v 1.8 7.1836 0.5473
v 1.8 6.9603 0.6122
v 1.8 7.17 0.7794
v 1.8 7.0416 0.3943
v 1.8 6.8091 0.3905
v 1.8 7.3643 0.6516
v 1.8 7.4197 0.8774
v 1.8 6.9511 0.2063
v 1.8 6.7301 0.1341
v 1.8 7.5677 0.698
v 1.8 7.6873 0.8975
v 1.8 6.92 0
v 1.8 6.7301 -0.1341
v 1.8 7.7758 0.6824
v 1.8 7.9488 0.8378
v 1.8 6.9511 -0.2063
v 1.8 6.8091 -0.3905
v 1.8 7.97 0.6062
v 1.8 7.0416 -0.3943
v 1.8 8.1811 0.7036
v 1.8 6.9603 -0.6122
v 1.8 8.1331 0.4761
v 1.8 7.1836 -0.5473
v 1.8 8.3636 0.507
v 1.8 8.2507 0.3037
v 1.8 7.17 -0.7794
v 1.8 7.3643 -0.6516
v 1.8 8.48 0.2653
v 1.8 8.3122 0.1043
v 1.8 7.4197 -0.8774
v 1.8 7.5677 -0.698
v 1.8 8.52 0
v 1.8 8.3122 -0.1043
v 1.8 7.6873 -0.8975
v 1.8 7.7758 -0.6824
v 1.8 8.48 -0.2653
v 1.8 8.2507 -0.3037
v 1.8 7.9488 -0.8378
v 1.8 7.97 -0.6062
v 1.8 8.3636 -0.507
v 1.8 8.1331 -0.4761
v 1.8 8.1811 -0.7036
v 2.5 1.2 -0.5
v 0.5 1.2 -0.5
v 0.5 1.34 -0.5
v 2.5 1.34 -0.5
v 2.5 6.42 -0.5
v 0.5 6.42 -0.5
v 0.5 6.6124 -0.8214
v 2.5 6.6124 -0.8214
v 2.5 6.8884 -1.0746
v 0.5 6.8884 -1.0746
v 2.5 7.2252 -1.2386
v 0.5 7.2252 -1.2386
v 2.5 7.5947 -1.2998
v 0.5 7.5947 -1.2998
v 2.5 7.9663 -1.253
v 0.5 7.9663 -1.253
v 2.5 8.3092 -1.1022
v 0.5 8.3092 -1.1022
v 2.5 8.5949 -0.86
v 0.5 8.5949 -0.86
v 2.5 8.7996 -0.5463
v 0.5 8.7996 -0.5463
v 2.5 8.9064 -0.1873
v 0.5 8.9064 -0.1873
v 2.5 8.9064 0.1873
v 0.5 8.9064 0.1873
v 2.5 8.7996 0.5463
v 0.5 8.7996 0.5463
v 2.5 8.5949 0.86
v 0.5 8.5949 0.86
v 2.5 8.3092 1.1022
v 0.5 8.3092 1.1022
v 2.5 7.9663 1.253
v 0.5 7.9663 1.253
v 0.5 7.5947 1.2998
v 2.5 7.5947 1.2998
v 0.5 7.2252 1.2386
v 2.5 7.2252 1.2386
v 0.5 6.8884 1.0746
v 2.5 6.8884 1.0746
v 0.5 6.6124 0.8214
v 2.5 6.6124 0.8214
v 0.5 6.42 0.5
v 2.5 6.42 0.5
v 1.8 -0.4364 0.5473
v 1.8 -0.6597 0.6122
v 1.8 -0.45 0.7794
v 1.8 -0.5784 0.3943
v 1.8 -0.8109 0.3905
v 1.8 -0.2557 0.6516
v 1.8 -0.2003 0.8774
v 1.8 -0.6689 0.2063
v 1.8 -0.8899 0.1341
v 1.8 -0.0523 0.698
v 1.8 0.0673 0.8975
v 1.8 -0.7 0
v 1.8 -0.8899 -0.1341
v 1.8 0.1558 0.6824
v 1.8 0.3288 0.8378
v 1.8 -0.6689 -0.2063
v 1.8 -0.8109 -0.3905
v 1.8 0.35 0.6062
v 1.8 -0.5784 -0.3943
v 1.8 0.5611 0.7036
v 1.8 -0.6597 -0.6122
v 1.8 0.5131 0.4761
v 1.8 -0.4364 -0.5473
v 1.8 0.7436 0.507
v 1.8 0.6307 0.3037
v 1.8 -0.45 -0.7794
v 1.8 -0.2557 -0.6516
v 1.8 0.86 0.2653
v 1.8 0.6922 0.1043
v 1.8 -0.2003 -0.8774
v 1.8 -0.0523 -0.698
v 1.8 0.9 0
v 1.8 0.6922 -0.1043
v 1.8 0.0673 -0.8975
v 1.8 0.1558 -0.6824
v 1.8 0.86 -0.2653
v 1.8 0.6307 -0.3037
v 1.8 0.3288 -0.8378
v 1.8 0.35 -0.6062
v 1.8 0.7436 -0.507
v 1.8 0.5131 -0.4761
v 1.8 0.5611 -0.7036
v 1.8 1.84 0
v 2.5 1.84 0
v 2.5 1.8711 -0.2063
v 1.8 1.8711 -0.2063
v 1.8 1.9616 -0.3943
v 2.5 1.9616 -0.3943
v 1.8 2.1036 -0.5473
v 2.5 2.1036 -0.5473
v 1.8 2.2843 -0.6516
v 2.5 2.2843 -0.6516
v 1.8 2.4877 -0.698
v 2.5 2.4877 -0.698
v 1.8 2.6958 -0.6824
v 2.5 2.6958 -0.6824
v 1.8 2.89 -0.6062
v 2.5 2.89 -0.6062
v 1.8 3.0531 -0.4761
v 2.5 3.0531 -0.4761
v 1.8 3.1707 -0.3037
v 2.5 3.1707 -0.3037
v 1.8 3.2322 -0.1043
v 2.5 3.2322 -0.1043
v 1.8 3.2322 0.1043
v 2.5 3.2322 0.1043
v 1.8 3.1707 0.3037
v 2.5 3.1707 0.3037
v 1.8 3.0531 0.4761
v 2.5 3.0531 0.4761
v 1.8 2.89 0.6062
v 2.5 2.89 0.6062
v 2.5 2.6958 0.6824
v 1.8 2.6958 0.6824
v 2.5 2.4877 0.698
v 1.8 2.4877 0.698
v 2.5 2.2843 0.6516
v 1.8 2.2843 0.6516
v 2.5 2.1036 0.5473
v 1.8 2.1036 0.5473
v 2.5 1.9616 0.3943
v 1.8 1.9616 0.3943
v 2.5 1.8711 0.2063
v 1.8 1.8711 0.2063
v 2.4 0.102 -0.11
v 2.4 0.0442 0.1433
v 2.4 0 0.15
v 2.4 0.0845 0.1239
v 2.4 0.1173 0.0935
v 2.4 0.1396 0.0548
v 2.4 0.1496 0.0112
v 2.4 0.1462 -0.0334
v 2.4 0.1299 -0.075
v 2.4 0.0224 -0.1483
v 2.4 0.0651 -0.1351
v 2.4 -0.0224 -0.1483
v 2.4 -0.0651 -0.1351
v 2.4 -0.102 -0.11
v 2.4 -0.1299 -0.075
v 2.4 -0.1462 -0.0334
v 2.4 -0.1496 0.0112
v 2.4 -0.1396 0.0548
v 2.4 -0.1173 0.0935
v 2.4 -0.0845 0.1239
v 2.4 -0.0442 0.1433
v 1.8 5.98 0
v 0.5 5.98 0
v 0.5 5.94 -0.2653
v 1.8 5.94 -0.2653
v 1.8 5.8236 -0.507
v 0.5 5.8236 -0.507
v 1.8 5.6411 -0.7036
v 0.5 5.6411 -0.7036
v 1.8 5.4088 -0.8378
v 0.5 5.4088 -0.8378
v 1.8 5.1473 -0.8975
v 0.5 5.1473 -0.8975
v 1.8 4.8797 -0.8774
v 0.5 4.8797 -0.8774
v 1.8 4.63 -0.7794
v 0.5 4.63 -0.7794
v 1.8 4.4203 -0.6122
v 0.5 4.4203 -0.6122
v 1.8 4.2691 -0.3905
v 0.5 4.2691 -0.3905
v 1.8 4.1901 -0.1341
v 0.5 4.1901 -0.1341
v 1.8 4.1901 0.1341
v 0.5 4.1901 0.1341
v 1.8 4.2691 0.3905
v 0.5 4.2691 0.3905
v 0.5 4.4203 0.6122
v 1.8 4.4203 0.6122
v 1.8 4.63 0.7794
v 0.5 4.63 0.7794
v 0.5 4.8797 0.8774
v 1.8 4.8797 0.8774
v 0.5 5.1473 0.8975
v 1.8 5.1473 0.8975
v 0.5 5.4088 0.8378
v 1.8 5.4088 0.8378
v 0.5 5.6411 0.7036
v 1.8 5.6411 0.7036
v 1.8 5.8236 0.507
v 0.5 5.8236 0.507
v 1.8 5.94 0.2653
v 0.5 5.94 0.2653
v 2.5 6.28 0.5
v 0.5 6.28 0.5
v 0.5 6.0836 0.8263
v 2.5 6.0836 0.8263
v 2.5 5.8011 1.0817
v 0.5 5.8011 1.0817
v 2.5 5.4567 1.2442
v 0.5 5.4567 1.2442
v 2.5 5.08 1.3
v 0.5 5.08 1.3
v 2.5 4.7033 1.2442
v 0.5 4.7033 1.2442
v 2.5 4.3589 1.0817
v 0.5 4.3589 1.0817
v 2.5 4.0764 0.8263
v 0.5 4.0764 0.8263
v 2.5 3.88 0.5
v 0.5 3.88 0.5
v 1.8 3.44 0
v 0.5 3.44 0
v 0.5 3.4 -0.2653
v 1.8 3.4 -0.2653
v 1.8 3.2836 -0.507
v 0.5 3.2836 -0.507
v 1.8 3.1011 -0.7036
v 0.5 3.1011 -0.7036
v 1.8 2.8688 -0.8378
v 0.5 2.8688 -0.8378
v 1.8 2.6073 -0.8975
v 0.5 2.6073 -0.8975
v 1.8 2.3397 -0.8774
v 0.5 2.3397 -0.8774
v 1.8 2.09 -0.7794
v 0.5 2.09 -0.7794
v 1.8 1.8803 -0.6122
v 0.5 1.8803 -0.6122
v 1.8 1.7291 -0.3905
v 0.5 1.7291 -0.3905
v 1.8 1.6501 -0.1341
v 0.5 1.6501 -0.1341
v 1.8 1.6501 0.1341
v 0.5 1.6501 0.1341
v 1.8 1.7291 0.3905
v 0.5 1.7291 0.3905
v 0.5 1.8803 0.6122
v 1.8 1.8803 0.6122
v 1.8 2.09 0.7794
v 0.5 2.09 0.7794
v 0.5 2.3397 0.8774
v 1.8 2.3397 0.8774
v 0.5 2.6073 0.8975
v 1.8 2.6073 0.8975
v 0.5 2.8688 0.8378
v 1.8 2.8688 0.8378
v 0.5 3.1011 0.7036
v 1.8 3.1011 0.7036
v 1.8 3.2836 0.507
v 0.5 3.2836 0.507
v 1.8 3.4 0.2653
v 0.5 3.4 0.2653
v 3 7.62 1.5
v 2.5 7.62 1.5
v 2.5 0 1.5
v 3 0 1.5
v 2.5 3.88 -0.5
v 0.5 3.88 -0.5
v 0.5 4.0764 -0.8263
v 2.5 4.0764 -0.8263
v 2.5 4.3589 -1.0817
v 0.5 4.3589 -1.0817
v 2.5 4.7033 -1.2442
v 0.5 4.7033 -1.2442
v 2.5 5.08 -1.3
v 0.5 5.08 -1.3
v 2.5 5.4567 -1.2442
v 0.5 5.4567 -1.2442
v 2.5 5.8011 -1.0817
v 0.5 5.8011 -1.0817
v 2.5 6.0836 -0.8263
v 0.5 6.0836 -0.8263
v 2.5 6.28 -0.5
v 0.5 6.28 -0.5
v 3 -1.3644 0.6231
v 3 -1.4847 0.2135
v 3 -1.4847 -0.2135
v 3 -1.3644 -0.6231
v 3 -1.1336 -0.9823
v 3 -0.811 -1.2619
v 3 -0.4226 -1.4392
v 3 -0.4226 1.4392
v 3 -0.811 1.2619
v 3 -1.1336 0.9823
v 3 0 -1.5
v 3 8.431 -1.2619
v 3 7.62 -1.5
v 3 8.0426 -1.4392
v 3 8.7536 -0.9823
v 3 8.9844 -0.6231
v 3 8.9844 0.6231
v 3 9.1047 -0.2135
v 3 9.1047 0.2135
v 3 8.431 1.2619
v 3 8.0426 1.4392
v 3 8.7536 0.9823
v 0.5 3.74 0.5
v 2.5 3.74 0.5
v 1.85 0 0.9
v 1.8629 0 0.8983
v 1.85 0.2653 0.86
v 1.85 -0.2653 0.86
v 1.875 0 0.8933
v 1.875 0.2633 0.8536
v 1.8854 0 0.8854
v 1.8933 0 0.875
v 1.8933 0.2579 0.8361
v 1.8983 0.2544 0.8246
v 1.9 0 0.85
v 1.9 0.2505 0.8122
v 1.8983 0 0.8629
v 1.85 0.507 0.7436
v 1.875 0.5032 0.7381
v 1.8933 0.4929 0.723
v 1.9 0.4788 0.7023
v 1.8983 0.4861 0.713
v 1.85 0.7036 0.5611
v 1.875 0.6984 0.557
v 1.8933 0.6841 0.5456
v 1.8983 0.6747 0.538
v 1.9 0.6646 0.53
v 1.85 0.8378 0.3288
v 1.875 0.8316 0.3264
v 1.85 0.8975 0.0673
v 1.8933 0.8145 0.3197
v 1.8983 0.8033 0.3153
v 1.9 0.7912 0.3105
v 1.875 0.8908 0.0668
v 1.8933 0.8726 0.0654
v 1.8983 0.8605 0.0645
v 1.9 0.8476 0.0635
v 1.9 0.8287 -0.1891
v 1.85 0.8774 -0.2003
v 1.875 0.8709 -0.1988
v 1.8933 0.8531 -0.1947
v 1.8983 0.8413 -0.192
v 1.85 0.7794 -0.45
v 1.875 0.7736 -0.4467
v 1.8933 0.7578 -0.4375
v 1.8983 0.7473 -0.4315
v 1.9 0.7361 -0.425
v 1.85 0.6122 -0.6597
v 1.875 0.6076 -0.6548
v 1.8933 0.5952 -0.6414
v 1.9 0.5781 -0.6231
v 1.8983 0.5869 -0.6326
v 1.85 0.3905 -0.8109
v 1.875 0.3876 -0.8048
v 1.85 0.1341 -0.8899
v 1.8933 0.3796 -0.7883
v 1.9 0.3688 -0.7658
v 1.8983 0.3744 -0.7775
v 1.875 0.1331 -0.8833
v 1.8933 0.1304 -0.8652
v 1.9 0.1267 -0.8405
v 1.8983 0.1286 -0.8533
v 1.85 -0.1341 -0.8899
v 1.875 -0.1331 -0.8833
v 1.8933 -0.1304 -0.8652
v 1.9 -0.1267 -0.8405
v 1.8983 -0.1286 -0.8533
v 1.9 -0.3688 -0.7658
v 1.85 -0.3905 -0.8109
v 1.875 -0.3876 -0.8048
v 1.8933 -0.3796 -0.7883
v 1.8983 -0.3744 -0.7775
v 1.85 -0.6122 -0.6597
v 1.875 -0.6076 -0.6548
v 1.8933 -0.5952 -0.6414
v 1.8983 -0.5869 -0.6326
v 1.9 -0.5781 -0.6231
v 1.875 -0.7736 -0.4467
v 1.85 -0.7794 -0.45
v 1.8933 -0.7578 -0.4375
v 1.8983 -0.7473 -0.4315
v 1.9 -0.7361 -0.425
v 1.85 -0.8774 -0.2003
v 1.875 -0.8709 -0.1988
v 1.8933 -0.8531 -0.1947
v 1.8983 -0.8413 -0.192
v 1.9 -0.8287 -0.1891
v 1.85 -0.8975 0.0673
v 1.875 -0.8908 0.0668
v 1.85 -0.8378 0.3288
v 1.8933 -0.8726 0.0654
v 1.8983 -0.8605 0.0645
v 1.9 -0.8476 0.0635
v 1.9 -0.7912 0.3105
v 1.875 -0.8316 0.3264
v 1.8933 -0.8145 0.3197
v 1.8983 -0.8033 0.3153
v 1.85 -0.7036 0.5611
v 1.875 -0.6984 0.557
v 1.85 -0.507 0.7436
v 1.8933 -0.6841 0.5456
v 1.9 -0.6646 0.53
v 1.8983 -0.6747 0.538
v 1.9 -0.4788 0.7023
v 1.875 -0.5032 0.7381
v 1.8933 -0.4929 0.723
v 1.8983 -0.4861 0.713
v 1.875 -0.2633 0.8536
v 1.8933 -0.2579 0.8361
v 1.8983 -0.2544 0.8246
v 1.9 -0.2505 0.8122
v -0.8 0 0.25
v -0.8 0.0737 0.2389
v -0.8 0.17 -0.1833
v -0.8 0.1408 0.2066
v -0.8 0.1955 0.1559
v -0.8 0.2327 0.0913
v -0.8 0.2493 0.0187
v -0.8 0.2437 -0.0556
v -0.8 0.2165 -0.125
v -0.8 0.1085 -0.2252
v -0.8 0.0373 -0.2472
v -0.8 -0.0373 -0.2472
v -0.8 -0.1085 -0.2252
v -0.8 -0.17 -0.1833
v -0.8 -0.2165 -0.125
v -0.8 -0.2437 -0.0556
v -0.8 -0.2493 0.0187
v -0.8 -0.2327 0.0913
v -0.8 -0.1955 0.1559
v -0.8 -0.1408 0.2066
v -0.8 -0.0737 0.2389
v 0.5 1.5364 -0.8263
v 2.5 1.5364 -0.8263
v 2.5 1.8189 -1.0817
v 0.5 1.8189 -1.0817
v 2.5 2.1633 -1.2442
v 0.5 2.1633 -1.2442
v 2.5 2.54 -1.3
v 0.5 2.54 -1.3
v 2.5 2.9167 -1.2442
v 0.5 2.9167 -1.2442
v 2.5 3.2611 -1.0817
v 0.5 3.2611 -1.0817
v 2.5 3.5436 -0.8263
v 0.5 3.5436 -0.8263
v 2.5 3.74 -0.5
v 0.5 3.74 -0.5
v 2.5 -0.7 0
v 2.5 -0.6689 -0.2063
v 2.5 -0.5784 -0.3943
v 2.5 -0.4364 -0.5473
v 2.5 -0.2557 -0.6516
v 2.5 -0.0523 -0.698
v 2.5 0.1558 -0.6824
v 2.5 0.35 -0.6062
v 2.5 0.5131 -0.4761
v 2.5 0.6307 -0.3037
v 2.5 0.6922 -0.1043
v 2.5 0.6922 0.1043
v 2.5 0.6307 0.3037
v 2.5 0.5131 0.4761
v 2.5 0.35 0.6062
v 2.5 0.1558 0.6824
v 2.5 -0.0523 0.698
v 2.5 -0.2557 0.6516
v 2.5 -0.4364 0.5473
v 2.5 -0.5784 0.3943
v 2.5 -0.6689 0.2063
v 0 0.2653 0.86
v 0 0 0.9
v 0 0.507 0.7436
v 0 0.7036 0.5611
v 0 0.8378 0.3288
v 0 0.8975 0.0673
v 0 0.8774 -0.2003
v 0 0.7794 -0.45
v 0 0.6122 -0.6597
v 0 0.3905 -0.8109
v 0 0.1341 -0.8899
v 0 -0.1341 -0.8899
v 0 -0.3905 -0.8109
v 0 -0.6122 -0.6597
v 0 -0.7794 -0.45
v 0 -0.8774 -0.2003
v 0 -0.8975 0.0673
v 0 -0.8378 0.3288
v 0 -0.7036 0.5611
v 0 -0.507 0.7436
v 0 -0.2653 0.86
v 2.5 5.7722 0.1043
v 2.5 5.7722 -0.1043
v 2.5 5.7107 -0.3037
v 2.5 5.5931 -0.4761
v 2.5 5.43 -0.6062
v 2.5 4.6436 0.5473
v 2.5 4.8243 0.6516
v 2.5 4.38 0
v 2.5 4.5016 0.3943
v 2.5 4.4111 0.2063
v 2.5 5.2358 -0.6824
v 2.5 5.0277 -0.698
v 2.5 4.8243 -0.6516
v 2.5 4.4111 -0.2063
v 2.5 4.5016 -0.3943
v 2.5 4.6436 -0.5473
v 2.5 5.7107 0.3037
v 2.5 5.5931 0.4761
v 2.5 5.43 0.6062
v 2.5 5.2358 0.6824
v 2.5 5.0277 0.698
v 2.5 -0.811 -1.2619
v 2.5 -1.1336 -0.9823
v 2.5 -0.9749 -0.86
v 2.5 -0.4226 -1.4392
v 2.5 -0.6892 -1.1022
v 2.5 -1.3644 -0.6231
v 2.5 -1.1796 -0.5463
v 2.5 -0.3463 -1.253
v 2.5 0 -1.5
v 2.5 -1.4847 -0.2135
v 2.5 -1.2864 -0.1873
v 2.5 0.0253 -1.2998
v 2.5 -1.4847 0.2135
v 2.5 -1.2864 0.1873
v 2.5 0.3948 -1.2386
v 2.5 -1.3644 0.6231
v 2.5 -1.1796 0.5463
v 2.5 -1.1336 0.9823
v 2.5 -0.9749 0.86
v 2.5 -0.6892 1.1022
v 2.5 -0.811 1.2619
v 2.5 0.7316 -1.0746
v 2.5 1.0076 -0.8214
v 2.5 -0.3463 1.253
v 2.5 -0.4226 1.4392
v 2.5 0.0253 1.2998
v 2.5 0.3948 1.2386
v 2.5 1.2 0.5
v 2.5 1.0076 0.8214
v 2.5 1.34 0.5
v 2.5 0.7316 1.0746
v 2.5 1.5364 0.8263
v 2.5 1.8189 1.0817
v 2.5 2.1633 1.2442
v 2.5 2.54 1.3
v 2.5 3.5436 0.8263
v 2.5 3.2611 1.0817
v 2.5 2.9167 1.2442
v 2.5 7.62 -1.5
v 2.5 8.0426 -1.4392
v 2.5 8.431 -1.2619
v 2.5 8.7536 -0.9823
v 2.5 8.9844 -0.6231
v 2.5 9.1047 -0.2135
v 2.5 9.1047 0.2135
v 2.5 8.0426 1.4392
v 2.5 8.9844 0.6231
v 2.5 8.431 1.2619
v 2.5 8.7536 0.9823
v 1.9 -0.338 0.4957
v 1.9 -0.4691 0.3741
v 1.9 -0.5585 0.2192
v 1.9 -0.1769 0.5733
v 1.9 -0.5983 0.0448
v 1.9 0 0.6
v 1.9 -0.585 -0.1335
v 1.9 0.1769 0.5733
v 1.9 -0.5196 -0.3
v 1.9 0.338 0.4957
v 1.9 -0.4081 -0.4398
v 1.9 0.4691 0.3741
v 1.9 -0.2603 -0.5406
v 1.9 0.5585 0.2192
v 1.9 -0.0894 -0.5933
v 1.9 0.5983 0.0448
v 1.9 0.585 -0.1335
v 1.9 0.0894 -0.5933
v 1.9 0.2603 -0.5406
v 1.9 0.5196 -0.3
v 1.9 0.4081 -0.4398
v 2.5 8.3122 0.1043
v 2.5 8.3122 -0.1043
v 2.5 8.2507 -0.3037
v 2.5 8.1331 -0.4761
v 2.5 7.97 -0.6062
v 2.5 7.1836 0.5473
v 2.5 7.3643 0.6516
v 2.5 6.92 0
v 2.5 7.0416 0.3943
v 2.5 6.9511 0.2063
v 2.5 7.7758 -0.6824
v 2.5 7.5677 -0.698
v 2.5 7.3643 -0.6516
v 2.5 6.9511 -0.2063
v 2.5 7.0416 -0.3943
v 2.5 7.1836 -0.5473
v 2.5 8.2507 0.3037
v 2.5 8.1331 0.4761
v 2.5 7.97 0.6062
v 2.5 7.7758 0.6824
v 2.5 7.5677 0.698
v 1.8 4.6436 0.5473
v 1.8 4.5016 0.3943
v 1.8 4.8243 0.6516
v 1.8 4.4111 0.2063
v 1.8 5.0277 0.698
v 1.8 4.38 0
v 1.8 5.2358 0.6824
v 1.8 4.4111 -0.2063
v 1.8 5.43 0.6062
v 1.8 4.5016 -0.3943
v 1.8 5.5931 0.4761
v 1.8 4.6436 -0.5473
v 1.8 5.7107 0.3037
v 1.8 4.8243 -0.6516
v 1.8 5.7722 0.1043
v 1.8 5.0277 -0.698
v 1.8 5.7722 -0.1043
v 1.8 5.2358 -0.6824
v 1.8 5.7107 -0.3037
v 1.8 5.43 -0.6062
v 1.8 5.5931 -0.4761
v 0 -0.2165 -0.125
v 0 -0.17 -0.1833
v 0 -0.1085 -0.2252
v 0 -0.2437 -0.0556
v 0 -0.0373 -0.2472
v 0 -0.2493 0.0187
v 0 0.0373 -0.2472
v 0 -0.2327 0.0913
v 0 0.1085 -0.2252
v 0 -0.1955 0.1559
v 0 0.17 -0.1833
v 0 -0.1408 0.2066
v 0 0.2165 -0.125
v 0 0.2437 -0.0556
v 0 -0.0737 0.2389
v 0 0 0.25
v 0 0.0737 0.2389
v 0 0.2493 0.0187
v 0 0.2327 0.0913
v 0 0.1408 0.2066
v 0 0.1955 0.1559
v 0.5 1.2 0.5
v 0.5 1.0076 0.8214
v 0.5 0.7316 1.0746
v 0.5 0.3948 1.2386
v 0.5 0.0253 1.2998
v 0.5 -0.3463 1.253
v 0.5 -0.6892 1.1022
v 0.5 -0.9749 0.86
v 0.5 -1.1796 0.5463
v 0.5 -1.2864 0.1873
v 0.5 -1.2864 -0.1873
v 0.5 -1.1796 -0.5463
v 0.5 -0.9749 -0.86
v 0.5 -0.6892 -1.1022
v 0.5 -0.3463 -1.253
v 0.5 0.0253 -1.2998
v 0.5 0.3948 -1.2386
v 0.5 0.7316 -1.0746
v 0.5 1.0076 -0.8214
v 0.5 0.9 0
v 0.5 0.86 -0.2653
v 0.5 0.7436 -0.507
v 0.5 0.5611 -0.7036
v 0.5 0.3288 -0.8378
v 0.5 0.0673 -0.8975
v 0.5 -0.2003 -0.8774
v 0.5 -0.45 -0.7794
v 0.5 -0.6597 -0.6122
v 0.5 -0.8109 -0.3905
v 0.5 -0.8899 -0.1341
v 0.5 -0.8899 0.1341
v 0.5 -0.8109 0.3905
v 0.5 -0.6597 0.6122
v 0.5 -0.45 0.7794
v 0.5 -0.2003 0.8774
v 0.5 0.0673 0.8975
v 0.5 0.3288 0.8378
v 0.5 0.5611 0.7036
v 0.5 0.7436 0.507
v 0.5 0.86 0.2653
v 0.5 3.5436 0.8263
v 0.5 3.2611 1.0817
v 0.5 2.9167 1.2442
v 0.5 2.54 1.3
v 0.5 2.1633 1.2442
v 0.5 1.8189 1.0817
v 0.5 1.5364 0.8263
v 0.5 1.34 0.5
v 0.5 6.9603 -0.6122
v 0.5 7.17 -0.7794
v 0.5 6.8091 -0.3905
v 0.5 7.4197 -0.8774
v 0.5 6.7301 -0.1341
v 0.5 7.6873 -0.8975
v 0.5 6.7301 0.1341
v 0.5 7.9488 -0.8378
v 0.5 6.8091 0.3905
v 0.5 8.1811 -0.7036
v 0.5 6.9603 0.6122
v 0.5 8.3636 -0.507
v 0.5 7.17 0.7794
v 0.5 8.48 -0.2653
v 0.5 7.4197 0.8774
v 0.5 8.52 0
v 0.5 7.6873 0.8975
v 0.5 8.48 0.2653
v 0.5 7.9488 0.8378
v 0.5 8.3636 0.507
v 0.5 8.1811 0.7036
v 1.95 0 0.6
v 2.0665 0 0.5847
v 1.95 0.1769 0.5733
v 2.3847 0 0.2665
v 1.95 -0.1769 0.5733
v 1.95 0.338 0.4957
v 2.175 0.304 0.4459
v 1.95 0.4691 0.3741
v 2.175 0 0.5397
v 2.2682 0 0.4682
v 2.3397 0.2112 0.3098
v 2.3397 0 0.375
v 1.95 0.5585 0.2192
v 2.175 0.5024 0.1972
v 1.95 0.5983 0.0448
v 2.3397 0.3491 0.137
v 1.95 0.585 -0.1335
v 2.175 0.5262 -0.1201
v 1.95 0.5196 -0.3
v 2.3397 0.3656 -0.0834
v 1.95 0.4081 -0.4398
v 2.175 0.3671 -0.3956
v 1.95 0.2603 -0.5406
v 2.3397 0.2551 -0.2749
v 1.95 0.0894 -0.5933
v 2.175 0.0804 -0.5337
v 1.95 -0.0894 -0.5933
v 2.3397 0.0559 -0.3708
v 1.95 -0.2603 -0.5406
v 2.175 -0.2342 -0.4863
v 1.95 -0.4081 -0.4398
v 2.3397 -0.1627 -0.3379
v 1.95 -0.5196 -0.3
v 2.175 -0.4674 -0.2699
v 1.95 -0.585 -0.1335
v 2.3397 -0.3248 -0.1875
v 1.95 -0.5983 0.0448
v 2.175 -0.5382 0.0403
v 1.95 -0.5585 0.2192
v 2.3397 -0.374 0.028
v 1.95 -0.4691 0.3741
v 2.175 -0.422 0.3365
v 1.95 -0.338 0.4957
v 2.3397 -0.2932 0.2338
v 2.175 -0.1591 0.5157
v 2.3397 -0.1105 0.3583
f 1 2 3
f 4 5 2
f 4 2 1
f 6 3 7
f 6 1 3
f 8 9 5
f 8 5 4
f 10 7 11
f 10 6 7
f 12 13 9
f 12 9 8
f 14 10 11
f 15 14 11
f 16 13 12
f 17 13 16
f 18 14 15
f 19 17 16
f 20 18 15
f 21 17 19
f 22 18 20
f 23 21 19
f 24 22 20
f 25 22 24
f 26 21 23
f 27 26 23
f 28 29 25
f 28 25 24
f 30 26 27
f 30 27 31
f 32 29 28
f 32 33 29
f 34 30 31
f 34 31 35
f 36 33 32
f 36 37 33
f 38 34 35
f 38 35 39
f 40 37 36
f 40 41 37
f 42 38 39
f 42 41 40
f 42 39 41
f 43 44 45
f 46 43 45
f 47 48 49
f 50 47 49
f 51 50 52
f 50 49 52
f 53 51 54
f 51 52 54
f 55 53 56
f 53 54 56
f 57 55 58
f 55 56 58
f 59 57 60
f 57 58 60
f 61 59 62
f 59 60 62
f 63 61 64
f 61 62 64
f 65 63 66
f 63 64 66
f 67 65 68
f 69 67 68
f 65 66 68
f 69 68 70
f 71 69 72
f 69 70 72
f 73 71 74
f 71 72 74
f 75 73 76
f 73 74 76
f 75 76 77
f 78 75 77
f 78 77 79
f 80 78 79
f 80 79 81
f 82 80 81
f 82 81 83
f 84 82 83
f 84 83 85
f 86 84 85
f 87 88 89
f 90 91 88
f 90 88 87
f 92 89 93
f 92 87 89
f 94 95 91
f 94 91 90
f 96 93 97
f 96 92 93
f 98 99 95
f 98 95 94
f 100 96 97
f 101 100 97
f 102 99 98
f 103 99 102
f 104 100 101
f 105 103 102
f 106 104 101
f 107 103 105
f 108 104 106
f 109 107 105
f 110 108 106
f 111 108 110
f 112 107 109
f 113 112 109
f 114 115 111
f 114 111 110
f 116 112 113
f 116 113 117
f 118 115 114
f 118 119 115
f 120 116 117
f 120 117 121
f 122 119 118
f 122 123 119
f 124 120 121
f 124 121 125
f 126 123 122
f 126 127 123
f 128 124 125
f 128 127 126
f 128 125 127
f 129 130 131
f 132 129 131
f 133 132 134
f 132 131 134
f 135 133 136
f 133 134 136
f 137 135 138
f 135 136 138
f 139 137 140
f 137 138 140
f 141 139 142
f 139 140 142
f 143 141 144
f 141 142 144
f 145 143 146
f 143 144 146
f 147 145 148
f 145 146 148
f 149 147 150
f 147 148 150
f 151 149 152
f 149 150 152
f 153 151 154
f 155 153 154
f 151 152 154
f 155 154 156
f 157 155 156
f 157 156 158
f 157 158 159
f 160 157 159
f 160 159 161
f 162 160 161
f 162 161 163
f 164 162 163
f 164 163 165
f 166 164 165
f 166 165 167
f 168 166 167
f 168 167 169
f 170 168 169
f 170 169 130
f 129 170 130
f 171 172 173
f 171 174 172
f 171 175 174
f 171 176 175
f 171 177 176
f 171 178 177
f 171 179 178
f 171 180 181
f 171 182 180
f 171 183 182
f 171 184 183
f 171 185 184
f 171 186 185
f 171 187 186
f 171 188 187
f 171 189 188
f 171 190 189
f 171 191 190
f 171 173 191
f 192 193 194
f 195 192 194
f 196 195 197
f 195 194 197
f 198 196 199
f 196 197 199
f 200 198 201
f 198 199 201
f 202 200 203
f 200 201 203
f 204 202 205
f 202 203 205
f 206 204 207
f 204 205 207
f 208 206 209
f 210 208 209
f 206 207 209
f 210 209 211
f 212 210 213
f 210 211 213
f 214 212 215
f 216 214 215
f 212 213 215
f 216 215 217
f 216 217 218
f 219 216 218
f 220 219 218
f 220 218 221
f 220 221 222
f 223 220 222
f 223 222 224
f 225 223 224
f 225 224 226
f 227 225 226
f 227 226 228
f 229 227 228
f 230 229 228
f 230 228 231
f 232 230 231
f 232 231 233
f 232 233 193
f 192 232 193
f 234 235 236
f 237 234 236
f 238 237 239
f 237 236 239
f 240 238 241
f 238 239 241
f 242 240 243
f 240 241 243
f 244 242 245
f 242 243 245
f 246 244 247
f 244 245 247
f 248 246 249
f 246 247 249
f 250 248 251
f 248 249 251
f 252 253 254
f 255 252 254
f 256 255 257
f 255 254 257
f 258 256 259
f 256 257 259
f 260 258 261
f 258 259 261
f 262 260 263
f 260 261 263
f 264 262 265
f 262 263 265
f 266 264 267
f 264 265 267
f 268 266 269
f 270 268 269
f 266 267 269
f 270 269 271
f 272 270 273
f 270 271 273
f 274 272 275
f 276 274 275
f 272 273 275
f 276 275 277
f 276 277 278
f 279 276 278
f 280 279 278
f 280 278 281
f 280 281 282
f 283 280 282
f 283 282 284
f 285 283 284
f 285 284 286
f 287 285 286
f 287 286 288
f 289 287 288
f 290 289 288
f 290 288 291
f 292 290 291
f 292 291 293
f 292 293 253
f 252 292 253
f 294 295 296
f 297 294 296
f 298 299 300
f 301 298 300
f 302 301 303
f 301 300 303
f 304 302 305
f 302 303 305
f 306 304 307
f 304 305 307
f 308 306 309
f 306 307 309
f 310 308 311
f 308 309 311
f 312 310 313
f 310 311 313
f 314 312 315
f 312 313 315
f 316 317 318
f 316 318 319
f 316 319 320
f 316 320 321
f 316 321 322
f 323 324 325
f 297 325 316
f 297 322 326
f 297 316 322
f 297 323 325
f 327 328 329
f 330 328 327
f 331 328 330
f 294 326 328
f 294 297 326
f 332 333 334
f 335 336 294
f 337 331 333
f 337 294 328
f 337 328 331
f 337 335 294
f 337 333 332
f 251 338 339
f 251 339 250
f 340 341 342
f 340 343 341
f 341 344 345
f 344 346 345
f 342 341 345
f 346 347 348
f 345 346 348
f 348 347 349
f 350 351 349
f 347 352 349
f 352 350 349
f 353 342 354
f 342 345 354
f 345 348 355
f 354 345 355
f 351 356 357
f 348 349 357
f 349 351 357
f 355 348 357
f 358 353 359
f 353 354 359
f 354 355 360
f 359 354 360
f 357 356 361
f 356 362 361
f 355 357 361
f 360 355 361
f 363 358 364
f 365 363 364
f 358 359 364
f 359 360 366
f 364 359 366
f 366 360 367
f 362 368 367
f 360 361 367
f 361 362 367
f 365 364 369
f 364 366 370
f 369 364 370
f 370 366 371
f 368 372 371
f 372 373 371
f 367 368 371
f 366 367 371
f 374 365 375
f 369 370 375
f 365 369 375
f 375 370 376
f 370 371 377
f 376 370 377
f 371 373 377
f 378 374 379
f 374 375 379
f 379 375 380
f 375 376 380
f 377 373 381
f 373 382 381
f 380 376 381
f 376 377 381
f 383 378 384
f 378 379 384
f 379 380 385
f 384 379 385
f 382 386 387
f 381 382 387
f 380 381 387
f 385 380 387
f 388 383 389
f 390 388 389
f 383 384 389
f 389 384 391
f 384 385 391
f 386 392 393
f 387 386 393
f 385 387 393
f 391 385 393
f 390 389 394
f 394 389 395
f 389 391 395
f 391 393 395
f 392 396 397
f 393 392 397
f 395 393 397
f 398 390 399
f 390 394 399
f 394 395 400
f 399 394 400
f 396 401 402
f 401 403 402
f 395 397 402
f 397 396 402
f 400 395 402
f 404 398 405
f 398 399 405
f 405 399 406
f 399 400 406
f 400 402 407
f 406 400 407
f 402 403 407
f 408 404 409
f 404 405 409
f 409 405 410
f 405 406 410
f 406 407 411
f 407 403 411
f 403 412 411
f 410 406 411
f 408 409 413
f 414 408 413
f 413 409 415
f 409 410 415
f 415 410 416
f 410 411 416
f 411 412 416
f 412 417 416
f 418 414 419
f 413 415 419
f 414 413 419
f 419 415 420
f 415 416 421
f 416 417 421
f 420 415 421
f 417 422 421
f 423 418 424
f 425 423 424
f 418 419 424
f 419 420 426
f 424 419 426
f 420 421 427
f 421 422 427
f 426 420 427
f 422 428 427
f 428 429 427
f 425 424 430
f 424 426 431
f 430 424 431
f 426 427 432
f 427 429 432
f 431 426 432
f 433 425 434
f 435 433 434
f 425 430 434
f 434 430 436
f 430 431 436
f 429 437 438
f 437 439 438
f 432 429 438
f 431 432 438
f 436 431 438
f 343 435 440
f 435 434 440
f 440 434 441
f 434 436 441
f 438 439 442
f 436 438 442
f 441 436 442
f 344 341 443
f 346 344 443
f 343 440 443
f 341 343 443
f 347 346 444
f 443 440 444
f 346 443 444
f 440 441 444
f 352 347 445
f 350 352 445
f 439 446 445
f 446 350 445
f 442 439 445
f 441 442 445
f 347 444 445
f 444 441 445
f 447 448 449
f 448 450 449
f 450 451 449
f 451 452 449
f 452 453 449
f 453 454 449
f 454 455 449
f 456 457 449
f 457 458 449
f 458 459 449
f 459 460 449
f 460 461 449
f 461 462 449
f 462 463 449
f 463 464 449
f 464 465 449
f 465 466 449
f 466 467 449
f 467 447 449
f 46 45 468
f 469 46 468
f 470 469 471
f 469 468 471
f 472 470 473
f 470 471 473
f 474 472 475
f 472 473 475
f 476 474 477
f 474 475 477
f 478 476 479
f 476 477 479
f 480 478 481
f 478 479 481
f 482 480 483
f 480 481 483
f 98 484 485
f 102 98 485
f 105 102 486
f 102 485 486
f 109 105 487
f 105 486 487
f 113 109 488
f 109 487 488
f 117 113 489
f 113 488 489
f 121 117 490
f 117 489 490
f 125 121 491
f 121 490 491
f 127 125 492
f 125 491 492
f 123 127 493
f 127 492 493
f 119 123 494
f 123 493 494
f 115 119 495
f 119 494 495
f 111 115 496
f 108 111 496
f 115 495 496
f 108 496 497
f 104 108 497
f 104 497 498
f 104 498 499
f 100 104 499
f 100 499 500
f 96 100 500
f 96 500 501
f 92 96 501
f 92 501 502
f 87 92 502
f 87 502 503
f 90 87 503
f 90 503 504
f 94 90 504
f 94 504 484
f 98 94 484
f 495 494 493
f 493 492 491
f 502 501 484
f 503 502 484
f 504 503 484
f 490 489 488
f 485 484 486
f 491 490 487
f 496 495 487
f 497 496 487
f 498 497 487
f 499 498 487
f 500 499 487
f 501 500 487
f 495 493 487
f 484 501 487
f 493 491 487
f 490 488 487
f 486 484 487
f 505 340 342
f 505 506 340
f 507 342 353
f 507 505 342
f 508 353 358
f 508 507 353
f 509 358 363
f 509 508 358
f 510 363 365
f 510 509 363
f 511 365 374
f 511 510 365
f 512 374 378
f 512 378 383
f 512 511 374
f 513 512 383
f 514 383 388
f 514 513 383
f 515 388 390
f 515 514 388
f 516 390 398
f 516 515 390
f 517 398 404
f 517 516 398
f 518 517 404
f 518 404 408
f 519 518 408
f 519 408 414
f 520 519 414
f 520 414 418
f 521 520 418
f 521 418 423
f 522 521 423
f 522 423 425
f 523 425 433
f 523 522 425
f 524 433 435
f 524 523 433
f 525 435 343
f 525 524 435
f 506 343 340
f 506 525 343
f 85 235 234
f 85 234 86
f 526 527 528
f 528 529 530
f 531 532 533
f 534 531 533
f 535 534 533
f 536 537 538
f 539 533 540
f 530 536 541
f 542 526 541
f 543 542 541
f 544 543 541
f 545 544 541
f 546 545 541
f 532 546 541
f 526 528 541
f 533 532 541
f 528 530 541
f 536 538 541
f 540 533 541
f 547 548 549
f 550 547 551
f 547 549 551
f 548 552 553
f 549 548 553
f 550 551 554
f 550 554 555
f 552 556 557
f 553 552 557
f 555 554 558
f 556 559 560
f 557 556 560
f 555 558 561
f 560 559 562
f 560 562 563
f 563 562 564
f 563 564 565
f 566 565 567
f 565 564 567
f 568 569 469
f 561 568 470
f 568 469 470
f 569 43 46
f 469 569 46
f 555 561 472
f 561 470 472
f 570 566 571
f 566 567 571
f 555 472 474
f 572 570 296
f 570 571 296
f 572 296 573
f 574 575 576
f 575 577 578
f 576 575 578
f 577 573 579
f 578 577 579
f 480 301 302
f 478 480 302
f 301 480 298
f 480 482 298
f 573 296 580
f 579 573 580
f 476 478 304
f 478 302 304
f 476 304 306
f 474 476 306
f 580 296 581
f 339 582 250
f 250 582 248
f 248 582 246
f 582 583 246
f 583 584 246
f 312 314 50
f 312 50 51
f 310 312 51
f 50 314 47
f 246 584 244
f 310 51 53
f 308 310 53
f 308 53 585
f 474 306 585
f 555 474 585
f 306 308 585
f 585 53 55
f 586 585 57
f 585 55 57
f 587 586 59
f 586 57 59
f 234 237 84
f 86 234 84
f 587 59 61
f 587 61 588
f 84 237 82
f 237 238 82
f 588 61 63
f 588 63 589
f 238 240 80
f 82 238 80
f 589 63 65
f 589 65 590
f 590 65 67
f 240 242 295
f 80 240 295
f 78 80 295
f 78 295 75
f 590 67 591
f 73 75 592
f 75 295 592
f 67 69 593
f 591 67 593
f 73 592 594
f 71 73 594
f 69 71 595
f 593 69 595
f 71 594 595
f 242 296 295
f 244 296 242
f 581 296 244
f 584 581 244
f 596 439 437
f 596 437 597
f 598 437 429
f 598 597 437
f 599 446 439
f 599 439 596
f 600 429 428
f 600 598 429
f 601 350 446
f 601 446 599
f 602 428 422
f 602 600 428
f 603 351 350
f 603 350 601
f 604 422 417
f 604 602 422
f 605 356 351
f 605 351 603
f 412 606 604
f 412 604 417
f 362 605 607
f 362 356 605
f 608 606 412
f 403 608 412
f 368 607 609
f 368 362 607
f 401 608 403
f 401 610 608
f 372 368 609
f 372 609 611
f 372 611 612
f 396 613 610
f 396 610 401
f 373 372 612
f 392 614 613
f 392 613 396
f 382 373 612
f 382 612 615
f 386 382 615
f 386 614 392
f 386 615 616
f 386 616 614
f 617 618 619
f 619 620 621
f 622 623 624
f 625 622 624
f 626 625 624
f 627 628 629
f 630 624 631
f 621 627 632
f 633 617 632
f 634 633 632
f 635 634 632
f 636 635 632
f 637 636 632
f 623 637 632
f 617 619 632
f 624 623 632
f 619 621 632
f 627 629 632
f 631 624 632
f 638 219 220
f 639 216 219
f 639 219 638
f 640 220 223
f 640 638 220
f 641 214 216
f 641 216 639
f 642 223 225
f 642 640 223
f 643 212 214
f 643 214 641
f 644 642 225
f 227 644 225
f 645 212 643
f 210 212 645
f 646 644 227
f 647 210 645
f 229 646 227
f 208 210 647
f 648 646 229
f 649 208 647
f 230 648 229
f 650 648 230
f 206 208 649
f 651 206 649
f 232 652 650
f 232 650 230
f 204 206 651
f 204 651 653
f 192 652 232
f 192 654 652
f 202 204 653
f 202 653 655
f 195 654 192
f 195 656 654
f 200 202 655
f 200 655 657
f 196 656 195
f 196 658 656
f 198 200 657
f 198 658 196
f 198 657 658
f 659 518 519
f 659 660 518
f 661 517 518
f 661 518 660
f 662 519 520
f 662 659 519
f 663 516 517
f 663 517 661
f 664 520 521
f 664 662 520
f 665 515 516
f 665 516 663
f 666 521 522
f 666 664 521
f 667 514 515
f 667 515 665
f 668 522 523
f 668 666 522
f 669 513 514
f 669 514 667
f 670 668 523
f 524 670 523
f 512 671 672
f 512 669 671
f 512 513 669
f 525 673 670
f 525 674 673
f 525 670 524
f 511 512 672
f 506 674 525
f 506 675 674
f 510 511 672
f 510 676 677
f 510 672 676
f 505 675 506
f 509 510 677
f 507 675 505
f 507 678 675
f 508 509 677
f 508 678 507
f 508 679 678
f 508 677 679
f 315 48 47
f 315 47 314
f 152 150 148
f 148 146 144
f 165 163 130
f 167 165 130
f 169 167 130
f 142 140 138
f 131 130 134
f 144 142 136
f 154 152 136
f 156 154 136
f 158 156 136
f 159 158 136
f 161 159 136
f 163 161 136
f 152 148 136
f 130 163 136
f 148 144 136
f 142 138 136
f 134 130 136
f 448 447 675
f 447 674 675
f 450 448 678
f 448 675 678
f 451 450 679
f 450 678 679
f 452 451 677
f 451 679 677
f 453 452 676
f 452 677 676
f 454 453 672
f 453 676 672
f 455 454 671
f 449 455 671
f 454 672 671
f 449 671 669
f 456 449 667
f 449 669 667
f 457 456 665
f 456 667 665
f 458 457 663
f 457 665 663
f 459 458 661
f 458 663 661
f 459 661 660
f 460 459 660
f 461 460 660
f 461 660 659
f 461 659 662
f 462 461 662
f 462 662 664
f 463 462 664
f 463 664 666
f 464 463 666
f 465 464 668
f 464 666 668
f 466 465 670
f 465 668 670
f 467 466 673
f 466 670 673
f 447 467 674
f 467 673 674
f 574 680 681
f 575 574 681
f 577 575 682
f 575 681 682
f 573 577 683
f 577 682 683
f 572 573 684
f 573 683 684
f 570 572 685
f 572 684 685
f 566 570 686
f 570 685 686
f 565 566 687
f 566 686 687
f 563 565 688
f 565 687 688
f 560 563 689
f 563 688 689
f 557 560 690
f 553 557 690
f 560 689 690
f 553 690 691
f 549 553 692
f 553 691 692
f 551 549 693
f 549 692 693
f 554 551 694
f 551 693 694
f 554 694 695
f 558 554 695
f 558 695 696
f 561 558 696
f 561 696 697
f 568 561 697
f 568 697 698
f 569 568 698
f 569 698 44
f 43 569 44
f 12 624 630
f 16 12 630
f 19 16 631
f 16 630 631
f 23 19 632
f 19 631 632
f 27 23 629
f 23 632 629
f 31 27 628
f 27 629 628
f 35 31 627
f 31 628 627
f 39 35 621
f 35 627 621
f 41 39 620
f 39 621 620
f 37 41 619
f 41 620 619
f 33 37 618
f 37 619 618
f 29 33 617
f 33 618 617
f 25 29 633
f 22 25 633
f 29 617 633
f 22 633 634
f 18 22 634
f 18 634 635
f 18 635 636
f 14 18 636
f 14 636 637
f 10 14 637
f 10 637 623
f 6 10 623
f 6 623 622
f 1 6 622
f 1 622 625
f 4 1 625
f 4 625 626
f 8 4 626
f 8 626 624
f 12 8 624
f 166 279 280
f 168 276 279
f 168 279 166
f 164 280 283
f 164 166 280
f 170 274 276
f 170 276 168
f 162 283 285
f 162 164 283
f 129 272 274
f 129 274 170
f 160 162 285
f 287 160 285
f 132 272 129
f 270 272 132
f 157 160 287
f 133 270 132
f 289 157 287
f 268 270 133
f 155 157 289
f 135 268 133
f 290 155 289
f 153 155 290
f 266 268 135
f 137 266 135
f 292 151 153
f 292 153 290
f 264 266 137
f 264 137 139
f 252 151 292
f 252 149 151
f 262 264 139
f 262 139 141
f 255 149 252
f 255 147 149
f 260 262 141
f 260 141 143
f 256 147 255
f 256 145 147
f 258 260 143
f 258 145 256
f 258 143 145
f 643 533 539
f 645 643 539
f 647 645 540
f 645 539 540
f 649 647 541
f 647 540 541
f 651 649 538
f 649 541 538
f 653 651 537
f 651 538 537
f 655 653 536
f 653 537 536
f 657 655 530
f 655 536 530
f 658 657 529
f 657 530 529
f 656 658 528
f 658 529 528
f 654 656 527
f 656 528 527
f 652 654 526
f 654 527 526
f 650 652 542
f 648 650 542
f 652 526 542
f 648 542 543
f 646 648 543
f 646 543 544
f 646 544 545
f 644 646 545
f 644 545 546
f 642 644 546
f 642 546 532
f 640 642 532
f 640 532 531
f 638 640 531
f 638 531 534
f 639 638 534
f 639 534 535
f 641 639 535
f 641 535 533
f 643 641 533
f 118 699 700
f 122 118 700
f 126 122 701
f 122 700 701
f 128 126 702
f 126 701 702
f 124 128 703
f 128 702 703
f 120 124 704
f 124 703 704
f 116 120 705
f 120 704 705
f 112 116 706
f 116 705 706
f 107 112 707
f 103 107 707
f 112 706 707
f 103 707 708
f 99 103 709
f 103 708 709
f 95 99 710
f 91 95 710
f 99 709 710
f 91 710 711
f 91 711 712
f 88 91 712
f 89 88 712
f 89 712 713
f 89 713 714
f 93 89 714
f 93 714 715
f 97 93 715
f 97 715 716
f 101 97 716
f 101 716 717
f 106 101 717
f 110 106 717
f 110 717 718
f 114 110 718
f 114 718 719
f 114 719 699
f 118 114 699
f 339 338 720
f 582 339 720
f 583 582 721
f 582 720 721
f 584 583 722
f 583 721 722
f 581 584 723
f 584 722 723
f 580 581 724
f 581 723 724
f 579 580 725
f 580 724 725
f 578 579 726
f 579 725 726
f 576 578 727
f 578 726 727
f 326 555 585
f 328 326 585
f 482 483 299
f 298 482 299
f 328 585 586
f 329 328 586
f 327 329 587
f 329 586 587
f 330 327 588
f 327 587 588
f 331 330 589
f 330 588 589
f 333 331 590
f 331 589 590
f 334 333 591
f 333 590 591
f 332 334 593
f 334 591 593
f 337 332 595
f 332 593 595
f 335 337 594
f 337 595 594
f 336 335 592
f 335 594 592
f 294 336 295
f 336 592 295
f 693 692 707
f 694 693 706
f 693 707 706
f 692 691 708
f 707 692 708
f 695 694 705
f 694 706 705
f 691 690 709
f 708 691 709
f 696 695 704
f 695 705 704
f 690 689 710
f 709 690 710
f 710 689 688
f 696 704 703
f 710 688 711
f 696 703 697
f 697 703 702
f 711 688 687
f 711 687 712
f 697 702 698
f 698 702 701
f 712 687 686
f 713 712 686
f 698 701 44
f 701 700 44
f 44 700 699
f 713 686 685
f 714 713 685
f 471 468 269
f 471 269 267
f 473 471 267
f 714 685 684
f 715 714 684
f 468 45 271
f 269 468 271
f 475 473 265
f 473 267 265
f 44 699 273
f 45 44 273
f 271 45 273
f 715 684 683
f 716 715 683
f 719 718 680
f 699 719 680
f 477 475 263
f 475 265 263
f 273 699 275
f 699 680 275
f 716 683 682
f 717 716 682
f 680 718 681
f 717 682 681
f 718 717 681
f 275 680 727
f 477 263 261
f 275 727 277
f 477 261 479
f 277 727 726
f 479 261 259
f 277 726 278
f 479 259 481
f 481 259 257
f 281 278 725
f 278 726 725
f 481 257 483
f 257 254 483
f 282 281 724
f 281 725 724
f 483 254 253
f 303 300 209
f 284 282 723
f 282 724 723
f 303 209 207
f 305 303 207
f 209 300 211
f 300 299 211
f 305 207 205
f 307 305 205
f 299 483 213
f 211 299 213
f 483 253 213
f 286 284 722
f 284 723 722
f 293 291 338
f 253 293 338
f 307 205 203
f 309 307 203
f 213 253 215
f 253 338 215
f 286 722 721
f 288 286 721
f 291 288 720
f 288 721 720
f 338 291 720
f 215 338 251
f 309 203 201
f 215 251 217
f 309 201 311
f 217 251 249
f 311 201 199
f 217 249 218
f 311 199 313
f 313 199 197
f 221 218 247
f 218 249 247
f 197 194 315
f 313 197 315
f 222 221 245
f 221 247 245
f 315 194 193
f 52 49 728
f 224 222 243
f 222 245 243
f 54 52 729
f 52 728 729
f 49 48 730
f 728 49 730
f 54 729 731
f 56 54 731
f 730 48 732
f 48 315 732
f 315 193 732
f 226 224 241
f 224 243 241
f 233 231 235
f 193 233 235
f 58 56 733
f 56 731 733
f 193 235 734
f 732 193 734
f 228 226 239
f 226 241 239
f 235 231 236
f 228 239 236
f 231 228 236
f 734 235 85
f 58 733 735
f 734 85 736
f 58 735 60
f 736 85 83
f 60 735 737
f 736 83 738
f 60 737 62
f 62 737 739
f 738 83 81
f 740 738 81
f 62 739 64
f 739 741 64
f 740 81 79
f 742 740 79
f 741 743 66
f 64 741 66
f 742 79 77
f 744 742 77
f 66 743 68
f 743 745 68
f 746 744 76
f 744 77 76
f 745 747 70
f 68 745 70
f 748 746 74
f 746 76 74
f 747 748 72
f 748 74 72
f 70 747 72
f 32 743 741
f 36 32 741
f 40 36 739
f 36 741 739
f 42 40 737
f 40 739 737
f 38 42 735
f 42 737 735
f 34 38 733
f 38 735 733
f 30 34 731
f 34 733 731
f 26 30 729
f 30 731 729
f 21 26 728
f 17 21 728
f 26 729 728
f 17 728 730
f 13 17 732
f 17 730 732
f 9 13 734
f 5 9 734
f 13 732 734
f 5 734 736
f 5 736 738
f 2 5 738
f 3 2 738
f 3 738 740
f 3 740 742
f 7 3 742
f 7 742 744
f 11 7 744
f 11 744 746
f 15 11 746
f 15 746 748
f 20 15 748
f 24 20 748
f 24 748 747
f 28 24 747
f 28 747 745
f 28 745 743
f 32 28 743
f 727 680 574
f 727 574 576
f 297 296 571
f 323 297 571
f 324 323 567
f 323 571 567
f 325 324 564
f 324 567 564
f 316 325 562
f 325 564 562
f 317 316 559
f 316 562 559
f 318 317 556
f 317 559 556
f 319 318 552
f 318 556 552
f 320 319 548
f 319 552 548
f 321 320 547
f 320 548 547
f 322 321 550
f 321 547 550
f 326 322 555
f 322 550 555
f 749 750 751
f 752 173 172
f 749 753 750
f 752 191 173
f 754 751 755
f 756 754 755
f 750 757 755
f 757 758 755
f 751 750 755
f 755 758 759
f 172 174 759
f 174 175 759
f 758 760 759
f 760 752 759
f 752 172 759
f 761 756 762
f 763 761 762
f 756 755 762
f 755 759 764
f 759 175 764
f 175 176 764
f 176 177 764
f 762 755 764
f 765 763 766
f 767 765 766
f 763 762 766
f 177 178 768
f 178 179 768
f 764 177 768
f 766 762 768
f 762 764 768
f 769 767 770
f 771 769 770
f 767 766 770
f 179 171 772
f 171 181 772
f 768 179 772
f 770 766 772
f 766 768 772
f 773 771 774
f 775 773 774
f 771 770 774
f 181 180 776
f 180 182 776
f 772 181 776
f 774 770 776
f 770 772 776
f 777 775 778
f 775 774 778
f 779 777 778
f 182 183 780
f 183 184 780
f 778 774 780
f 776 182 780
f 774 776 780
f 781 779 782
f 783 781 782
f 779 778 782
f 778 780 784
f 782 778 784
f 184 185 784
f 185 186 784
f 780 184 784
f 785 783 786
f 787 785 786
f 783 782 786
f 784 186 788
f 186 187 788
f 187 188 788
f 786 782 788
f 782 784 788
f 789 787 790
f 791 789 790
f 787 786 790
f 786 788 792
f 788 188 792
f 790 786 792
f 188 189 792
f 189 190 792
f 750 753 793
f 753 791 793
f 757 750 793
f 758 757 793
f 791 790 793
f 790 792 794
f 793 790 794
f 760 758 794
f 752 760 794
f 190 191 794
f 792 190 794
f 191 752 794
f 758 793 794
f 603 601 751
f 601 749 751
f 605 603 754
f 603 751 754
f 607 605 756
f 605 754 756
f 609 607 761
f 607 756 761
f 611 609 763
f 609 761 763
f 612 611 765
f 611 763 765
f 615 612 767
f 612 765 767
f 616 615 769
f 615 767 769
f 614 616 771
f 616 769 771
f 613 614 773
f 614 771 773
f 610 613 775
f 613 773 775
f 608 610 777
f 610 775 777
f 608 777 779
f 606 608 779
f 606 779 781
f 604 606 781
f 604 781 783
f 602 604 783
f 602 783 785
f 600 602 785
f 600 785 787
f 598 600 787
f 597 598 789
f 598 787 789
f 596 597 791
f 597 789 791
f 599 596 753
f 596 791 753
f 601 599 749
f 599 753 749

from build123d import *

# Parameters (mm, degrees)
PAD_DEPTH        = 2
PAD001_DEPTH     = 0.5
HOLE_D           = 1.4
HOLE_DEPTH       = 2
HOLE_CBORE_D     = 1.8
HOLE_CBORE_DEPTH = 1.3


with BuildPart() as smt_conn_pogo:
    # Sketch → Revolution (revolve)
    with BuildSketch(Plane(origin=(0, 0, 0), x_dir=(-1, 0, 0), z_dir=(0, 1, 0))):
        with BuildLine():
            Line((-1.85, 0.9), (0, 0.9))
            Line((0, 0.9), (0, 0.25))
            Line((0.8, 0.25), (0, 0.25))
            Line((0.8, 0), (0.8, 0.25))
            Line((-2.4, 0), (0.8, 0))
            Line((-2.4, 0), (-2.4, 0.15))
            ThreePointArc((-1.95, 0.6), (-2.268198, 0.468198), (-2.4, 0.15))
            Line((-1.9, 0.6), (-1.95, 0.6))
            Line((-1.9, 0.6), (-1.9, 0.85))
            ThreePointArc((-1.85, 0.9), (-1.885355, 0.885355), (-1.9, 0.85))
        make_face()
    revolve(axis=Axis((0, 0, 0), (-1, 0, 0)))


with BuildPart() as smt_conn_pogo_cap:
    # Sketch001 → Pad (new body)
    with BuildSketch(Plane.YZ.offset(0.5)):
        with BuildLine():
            ThreePointArc((1.2, 0.5), (-1.3, 0), (1.2, -0.5))
            Line((1.2, -0.5), (1.34, -0.5))
            ThreePointArc((1.34, -0.5), (2.54, -1.3), (3.74, -0.5))
            Line((3.74, -0.5), (3.88, -0.5))
            ThreePointArc((3.88, -0.5), (5.08, -1.3), (6.28, -0.5))
            Line((6.42, -0.5), (6.28, -0.5))
            ThreePointArc((6.42, -0.5), (8.92, 0), (6.42, 0.5))
            Line((6.28, 0.5), (6.42, 0.5))
            ThreePointArc((6.28, 0.5), (5.08, 1.3), (3.88, 0.5))
            Line((3.74, 0.5), (3.88, 0.5))
            ThreePointArc((3.74, 0.5), (2.54, 1.3), (1.34, 0.5))
            Line((1.2, 0.5), (1.34, 0.5))
        make_face()
    extrude(amount=PAD_DEPTH)

    # Sketch002 → Pad001 (join)
    with BuildSketch(Plane.YZ.offset(2.5)):
        with BuildLine():
            ThreePointArc((0, 1.5), (-1.5, 0), (0, -1.5))
            Line((0, -1.5), (7.62, -1.5))
            ThreePointArc((7.62, -1.5), (9.12, 0), (7.62, 1.5))
            Line((7.62, 1.5), (0, 1.5))
        make_face()
    extrude(amount=PAD001_DEPTH)

    # Hole
    with Locations(Plane(origin=(0.5, 0, 0), x_dir=(0, 1, 0), z_dir=(-1, 0, 0))):
        with Locations((0, 0), (2.54, 0), (5.08, 0), (7.62, 0)):
            CounterBoreHole(HOLE_D / 2, HOLE_CBORE_D / 2, HOLE_CBORE_DEPTH, depth=HOLE_DEPTH)


solid = Compound([smt_conn_pogo.part, smt_conn_pogo_cap.part])
